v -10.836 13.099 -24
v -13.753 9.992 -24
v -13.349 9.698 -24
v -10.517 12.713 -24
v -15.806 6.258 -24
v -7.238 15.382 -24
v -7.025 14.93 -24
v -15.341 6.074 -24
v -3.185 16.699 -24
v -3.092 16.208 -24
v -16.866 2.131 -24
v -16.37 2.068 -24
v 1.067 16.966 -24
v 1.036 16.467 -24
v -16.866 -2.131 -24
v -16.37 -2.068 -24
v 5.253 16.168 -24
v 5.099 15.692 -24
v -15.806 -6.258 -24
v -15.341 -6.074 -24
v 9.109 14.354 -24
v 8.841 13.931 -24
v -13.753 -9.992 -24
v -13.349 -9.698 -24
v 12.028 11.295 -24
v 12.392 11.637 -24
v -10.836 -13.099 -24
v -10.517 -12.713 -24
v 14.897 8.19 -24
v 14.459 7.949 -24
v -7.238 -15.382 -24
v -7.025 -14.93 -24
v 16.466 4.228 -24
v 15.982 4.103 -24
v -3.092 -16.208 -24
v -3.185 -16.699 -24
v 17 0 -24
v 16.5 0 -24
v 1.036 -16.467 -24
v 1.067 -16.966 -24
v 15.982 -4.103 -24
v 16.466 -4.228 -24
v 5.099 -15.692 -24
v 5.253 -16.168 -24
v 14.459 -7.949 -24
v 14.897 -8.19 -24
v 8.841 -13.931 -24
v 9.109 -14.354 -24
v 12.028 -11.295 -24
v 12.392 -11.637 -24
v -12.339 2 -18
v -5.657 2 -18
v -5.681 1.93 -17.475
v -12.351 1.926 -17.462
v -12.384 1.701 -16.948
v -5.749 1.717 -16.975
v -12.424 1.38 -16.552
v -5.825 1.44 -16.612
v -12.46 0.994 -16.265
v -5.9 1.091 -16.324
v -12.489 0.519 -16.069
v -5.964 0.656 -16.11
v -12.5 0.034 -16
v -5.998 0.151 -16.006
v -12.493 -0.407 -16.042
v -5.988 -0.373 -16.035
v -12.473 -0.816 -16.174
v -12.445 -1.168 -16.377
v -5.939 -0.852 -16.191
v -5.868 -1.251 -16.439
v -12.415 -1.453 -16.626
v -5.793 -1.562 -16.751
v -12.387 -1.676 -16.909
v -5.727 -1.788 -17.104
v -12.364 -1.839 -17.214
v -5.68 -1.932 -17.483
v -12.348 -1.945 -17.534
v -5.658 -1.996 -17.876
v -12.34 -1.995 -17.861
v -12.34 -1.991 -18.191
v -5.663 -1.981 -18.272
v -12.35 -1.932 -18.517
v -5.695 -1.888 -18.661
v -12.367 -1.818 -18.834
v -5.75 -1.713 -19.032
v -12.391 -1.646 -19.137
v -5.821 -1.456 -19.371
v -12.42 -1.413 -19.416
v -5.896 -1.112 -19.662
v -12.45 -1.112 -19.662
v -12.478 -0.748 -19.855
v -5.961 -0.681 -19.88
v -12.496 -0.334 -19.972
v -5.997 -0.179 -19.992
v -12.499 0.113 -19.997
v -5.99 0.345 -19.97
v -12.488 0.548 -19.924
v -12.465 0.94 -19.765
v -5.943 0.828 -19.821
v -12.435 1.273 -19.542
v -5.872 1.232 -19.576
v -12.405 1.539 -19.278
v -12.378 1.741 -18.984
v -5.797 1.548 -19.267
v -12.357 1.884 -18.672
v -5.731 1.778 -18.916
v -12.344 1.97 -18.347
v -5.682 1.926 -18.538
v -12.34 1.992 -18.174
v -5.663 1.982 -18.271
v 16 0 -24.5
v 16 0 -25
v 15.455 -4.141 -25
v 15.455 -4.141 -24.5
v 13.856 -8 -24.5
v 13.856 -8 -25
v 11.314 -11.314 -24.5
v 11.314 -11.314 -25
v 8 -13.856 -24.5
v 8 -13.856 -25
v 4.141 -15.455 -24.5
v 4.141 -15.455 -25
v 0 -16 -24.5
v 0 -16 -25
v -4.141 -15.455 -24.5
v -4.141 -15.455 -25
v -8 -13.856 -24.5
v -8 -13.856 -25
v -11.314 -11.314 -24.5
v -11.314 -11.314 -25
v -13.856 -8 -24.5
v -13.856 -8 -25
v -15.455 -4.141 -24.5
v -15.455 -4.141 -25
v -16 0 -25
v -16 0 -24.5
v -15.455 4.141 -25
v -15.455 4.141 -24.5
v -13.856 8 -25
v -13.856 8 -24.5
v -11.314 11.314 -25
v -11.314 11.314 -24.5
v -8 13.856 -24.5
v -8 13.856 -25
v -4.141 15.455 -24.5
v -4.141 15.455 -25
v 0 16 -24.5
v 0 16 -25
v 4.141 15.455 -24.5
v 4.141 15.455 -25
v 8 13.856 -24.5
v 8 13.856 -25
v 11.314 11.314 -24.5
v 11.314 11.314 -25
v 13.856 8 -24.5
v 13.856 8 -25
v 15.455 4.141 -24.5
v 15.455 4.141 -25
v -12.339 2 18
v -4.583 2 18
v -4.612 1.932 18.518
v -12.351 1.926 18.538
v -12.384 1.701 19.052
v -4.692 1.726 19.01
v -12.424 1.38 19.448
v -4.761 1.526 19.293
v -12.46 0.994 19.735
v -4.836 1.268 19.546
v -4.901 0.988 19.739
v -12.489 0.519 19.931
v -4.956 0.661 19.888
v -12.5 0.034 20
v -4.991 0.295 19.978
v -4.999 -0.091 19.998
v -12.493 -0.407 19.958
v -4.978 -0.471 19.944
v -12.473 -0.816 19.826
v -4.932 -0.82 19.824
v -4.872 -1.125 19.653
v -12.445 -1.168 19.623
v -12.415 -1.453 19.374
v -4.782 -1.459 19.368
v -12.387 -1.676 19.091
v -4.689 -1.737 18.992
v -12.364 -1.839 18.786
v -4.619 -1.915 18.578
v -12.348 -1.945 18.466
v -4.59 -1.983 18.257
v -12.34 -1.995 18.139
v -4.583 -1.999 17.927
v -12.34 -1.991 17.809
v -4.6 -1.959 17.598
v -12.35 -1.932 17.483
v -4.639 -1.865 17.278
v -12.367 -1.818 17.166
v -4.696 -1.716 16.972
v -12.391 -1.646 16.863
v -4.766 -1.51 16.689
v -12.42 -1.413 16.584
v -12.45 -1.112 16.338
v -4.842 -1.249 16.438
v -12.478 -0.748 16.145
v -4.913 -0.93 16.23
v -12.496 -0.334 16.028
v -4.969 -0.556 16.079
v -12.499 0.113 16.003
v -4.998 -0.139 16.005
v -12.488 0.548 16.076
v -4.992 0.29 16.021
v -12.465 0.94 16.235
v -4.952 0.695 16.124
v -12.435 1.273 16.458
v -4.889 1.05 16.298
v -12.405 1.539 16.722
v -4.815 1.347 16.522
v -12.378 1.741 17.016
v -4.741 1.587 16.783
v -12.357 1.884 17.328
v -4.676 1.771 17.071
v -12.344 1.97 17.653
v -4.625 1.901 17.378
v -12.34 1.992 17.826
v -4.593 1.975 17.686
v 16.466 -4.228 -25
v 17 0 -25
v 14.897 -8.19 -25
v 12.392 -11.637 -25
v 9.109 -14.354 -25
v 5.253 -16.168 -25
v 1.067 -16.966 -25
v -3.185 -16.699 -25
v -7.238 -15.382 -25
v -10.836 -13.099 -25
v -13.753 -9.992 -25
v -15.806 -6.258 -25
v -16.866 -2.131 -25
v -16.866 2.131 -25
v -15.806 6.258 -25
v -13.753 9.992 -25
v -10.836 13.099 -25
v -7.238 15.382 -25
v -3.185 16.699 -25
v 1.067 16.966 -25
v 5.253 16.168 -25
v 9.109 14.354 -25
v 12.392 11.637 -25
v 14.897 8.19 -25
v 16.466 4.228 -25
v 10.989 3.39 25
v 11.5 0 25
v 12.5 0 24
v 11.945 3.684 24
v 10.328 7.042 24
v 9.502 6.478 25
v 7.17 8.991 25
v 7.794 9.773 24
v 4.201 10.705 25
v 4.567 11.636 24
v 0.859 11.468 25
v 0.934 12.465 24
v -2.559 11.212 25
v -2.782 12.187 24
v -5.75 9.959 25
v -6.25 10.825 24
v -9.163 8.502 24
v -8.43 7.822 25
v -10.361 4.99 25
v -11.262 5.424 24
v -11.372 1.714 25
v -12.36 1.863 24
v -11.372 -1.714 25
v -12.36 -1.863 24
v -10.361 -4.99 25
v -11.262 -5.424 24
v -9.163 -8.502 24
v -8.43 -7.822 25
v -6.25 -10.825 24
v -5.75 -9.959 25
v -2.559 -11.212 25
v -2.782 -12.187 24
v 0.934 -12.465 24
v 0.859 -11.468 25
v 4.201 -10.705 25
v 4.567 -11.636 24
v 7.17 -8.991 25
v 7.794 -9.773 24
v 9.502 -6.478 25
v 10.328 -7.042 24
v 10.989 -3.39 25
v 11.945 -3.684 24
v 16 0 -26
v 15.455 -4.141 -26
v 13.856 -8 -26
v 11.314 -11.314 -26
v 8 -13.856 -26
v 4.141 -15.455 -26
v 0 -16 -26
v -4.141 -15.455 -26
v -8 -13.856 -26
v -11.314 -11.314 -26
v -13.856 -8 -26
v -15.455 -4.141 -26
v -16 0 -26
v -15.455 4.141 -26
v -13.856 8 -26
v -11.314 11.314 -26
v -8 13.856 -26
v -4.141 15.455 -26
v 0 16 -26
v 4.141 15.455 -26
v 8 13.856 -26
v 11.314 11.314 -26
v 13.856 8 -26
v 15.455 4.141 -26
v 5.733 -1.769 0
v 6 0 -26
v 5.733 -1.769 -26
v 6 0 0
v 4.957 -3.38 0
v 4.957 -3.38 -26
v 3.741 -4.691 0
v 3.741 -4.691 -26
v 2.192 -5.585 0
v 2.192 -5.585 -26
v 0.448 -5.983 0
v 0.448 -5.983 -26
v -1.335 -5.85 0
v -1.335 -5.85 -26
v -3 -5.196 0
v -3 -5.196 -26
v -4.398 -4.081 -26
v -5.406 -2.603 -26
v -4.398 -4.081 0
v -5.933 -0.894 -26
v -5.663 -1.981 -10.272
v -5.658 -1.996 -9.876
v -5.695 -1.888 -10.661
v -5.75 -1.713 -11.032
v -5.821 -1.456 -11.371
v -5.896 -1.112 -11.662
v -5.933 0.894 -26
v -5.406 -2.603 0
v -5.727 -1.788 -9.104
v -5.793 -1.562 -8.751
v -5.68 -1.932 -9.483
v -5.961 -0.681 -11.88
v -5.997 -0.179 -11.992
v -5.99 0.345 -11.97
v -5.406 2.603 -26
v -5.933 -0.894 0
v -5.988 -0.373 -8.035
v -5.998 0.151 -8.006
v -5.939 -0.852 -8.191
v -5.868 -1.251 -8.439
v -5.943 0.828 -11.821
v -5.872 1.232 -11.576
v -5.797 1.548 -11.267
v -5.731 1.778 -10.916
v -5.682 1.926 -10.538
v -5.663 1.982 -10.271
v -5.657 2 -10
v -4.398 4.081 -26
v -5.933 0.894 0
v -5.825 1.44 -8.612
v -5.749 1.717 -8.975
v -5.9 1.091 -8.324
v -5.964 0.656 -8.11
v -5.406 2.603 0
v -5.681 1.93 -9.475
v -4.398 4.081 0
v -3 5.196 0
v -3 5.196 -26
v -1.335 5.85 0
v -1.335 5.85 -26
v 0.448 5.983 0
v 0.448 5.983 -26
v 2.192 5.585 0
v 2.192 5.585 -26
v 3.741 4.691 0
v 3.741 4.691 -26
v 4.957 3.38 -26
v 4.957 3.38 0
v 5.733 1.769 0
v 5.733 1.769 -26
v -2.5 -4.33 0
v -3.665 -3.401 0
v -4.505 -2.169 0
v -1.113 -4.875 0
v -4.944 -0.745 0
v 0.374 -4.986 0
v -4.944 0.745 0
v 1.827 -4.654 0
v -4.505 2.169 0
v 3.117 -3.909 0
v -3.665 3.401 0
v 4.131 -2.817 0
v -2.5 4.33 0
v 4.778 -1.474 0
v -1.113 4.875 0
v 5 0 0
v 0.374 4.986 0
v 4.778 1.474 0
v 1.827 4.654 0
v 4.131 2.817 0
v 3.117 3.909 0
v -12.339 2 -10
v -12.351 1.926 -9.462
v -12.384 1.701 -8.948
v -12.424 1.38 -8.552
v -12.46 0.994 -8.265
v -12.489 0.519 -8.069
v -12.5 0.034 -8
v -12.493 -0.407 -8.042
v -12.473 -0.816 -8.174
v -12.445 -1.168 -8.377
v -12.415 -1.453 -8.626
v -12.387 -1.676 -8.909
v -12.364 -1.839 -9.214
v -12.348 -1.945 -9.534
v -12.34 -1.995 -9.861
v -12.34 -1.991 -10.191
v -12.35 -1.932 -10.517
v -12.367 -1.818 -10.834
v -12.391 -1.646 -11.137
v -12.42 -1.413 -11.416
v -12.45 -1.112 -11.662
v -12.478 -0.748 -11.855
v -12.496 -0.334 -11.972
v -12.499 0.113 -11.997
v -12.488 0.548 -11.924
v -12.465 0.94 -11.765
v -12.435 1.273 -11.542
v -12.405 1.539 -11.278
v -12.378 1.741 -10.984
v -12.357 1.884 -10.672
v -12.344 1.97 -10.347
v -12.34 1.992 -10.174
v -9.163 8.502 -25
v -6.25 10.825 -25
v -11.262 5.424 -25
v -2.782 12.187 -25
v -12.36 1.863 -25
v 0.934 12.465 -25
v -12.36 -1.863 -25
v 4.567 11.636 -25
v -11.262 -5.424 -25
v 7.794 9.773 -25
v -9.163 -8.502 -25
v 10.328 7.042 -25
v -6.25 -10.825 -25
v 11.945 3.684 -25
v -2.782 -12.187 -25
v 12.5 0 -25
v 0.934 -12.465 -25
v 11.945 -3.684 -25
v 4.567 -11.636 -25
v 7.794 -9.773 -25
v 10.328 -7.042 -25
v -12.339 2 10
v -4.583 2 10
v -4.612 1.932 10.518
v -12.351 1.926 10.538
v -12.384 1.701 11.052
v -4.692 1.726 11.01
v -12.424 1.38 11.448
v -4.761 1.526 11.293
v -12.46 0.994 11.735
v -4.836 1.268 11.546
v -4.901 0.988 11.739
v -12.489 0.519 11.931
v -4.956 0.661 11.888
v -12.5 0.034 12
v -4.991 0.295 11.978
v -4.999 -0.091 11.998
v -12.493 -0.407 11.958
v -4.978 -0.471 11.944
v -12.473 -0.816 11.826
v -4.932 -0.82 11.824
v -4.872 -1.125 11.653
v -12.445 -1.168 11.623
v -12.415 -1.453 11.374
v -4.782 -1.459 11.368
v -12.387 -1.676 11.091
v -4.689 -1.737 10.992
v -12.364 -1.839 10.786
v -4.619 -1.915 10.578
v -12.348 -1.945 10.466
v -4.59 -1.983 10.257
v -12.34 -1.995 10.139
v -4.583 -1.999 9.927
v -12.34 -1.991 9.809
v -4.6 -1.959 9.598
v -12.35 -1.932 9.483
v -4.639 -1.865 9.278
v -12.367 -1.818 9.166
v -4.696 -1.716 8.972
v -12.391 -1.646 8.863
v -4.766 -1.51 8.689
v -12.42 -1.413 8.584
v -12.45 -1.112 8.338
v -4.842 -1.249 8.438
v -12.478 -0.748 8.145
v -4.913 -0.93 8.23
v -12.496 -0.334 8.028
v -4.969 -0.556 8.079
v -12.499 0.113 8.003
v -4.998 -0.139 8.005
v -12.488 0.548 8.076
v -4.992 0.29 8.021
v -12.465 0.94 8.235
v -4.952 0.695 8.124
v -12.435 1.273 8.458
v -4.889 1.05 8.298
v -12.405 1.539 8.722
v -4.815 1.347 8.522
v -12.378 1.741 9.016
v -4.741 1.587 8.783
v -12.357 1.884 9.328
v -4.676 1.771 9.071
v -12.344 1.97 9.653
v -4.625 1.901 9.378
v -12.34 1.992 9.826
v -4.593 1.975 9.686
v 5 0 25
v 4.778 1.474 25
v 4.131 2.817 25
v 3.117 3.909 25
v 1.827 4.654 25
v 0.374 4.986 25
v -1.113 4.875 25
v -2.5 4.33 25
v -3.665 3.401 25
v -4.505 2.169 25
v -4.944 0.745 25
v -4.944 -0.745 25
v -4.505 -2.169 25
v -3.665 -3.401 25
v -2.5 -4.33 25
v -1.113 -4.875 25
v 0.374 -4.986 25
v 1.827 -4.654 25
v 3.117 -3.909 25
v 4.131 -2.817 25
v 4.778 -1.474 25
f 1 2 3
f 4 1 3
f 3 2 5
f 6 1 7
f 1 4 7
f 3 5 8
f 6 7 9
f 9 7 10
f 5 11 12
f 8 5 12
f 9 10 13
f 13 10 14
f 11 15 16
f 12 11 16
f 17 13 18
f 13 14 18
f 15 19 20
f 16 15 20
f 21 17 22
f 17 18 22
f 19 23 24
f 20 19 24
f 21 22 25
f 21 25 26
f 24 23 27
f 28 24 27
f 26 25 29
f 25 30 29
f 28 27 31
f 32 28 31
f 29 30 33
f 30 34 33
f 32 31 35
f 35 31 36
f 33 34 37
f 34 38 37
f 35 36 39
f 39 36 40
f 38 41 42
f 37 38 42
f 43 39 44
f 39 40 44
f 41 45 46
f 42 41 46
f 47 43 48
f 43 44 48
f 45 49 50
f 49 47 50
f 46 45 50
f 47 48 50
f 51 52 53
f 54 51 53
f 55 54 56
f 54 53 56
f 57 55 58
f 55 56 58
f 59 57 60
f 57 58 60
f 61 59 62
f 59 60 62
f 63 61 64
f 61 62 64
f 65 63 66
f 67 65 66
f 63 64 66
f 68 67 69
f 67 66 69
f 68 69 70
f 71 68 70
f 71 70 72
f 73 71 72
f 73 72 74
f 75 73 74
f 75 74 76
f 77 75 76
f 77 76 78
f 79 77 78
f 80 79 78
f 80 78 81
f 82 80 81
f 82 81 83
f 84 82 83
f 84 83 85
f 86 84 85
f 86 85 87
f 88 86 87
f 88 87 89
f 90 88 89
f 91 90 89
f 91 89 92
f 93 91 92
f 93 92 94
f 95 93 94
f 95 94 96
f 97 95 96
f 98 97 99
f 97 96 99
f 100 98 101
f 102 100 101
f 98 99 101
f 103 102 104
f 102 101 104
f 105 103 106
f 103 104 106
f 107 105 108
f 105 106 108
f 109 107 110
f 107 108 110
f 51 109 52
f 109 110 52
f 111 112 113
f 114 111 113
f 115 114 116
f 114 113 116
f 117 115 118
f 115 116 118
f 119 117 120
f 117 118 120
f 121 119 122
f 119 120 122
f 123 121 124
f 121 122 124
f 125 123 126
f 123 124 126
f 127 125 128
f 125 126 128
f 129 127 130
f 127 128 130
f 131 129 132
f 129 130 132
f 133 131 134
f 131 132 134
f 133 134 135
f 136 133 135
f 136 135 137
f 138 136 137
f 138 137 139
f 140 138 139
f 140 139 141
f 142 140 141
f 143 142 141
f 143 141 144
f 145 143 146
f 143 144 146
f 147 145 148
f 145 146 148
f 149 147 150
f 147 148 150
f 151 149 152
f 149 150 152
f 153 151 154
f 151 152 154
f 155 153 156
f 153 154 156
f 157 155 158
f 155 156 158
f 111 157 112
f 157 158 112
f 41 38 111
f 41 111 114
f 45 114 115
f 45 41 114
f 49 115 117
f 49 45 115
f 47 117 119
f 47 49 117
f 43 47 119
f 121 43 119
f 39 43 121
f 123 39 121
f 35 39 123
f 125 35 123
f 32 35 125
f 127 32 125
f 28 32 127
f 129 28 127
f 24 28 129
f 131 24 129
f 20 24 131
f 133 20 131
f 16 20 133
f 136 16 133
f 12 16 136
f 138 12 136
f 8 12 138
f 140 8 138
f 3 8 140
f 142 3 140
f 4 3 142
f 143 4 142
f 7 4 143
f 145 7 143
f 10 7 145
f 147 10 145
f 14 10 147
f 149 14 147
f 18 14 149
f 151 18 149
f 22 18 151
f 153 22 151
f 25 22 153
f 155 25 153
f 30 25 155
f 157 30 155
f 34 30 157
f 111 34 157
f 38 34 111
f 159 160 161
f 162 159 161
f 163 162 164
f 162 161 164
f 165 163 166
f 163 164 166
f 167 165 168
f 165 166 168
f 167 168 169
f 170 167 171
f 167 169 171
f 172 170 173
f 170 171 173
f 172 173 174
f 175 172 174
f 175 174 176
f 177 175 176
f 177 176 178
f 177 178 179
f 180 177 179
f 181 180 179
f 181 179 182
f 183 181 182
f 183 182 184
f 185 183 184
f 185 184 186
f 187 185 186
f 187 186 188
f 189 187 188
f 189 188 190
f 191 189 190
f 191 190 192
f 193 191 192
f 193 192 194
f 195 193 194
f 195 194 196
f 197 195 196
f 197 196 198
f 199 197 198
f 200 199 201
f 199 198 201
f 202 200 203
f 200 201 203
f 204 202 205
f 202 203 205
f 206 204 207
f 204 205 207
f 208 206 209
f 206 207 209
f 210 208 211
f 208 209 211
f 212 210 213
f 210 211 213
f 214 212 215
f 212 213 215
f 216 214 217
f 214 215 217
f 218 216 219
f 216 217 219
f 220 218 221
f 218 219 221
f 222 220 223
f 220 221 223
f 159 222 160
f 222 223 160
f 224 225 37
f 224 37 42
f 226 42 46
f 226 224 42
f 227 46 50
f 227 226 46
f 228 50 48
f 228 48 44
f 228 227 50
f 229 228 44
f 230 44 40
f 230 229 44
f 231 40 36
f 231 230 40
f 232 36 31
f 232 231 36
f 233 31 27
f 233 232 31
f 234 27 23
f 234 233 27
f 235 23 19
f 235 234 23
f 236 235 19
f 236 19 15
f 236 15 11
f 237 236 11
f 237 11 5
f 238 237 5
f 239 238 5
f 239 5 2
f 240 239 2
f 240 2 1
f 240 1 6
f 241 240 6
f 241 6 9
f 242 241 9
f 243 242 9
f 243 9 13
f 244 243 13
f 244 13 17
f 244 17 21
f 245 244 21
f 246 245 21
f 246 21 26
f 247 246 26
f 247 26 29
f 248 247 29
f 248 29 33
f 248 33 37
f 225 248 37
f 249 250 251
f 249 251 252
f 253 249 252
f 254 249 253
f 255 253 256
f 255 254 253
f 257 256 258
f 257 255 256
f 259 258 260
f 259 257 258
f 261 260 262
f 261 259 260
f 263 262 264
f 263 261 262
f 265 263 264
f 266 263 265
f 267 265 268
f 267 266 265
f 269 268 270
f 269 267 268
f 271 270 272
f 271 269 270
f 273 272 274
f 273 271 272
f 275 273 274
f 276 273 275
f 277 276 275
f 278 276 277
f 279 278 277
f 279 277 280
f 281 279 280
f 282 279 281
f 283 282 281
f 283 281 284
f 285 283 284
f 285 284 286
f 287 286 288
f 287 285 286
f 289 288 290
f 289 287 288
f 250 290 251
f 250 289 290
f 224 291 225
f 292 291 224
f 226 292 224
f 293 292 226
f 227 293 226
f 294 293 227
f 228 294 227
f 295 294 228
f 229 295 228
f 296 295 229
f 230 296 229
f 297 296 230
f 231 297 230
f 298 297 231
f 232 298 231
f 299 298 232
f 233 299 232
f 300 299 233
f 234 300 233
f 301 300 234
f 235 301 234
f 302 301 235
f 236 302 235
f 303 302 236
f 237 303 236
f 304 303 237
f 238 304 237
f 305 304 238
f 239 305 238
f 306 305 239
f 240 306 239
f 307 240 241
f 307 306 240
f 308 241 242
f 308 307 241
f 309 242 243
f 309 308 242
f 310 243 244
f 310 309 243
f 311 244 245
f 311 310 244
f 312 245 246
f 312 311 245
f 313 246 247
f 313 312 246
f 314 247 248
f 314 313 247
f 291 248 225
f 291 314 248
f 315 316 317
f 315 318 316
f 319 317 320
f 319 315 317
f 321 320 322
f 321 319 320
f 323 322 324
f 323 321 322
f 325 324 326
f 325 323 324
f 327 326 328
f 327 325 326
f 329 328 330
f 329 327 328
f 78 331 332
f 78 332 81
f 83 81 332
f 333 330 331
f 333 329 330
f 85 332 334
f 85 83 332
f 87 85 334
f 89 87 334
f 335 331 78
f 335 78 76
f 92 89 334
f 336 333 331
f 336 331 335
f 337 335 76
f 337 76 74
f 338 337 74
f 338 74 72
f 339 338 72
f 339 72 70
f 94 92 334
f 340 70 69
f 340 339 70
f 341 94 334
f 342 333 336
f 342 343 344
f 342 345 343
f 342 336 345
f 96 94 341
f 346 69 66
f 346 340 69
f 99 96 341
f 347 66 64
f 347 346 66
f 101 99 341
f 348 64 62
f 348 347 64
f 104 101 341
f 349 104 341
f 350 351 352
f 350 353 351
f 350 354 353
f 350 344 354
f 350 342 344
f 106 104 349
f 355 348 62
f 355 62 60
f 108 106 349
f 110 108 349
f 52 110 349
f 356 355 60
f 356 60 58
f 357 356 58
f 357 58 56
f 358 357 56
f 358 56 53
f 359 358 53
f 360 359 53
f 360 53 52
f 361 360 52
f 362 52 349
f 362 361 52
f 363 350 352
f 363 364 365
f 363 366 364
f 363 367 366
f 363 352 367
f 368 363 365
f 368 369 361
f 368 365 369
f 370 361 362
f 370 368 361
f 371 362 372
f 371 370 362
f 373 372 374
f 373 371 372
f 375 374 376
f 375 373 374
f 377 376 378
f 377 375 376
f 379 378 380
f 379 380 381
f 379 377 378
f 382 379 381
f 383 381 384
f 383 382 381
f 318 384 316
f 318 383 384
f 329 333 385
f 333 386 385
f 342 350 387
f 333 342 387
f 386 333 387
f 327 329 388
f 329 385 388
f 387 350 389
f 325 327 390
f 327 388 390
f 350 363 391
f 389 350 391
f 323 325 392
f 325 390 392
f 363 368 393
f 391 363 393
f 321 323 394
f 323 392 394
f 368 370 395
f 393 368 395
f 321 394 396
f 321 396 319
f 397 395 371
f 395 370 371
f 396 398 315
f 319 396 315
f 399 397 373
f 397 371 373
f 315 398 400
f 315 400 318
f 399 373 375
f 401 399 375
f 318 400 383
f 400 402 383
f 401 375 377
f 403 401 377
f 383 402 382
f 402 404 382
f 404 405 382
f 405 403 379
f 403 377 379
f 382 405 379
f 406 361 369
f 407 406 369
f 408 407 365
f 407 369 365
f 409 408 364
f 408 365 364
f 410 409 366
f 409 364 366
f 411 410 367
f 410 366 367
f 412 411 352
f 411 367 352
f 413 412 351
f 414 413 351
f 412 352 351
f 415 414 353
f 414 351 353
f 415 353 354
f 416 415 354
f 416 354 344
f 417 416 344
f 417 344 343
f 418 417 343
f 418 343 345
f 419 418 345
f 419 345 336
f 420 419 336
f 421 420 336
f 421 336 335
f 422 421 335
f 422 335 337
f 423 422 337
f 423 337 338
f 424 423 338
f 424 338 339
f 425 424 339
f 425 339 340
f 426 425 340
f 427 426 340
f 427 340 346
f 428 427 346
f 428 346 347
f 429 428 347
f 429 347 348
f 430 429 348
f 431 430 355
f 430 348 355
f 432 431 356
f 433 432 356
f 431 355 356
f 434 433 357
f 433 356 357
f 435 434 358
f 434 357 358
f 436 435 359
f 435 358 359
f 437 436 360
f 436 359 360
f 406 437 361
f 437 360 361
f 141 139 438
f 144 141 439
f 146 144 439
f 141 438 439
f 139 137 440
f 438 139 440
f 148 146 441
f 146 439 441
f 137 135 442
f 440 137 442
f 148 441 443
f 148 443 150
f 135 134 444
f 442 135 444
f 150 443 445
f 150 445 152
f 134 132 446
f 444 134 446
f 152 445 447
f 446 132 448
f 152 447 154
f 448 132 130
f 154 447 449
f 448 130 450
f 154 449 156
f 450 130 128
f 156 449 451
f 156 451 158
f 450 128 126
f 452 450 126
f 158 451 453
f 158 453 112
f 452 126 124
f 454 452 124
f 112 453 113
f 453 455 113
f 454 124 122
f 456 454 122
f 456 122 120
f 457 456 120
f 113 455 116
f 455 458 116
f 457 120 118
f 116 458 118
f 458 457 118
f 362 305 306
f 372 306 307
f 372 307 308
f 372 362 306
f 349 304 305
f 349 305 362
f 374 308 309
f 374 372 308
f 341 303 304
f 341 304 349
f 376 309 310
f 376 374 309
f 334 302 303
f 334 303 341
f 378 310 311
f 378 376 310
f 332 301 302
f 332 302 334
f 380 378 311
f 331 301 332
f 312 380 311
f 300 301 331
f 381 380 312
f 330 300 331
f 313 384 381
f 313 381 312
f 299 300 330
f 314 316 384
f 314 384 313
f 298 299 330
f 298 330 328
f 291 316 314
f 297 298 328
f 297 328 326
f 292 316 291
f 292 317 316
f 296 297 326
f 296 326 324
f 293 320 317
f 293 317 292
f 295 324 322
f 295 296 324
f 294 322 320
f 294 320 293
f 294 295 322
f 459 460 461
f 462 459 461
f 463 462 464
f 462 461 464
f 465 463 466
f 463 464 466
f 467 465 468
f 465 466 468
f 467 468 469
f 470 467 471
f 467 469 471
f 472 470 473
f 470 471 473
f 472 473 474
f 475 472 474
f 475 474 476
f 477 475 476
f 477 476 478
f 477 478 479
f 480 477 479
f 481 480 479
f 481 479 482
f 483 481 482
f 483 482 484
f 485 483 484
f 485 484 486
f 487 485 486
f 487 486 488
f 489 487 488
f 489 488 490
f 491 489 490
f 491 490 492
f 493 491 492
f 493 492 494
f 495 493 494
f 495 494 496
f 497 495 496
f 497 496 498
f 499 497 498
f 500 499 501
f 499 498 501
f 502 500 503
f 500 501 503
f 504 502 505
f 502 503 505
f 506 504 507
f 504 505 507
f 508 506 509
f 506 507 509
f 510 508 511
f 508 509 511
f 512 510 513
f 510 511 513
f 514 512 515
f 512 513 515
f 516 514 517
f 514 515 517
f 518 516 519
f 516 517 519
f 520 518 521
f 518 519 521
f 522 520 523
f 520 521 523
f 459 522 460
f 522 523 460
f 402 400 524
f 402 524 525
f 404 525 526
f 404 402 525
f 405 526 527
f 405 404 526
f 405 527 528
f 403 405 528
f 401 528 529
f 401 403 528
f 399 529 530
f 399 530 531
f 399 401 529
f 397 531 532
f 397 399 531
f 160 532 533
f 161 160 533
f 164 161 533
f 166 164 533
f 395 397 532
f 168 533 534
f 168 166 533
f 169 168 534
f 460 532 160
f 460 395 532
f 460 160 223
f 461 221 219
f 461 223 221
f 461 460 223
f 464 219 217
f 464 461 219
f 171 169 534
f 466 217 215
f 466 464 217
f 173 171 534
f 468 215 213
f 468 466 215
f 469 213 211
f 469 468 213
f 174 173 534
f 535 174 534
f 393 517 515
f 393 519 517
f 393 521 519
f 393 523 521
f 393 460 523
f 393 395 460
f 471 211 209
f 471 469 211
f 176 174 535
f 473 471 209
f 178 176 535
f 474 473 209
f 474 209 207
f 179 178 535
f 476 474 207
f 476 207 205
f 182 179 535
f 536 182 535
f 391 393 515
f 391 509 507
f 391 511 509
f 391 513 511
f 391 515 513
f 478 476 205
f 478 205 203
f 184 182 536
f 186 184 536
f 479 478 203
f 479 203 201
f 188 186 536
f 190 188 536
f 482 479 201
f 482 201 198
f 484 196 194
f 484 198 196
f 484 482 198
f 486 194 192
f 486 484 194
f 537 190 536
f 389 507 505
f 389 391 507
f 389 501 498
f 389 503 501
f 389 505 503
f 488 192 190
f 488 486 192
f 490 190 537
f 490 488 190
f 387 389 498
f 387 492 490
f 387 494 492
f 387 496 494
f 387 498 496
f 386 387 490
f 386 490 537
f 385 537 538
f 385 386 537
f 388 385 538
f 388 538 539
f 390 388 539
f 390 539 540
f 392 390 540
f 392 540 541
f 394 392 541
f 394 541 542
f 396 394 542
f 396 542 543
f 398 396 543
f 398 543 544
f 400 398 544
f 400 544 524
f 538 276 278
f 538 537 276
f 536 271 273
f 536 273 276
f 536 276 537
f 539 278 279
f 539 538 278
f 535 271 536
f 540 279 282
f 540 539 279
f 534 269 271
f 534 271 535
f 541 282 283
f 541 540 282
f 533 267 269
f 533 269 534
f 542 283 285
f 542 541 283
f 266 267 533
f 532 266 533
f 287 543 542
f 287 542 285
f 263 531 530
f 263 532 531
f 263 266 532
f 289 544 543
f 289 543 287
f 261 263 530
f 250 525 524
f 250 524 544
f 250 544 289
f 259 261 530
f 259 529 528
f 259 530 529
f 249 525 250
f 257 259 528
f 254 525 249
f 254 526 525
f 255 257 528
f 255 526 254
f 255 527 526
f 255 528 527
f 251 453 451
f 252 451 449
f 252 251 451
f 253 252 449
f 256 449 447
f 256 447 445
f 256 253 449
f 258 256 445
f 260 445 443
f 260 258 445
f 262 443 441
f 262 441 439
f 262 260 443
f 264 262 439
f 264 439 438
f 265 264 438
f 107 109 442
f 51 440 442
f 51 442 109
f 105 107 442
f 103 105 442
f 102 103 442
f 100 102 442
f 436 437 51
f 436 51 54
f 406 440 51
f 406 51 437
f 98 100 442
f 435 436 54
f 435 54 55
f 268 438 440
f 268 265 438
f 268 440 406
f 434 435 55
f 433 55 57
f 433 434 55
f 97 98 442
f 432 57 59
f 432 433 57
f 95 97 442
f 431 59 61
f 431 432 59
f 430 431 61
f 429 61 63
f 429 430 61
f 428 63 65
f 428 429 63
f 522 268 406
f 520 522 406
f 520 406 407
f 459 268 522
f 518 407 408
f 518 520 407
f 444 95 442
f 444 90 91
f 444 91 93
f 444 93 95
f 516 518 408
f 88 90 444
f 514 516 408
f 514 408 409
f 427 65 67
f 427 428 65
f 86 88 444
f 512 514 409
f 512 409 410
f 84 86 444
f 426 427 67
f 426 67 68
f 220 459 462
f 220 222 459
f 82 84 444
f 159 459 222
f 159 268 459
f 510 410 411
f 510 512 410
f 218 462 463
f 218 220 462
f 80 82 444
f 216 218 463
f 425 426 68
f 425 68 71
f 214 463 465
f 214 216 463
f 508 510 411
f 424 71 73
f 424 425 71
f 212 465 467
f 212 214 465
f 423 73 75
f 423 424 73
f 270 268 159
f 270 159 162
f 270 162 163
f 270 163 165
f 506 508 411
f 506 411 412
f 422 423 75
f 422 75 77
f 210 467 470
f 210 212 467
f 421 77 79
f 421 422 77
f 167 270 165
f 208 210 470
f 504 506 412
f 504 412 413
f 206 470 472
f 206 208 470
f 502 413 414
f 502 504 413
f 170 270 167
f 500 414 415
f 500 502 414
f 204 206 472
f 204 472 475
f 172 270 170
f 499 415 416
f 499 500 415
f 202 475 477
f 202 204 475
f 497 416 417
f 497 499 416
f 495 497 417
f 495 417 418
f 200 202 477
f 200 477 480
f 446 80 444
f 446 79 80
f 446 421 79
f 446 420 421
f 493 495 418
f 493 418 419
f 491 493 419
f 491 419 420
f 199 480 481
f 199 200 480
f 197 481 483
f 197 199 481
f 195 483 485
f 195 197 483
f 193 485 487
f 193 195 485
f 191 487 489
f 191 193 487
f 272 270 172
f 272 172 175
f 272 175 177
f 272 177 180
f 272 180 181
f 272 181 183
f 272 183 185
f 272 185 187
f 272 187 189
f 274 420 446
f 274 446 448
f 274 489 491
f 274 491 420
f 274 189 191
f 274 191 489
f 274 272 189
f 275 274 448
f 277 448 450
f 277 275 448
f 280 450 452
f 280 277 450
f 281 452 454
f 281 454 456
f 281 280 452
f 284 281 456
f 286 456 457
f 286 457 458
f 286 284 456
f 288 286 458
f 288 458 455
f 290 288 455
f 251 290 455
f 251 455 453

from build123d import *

# Parameters (mm, degrees)
F0_R     = 12.5
F0_R_2   = 6
F0_R_3   = 5
F1_DEPTH = 25
F2_DEPTH = 25
F3_R     = 2
F4_DEPTH = 25
F5_SIZE  = 1
F6_R     = 17
F6_R_2   = 16
F6_R_3   = 12.5
F6_R_4   = 6
F7_DEPTH = 1
F8_DEPTH = 1
F9_SIZE  = 0.5
F10_SIZE = 0.99999


# Not quite as in the source:
# - a fillet or chamfer is up to 0.001 mm smaller than in the source, because OpenCascade refuses the exact size


with BuildPart() as f1:
    # F0 (on Top) → F1 (new body)
    with BuildSketch(Plane.XY):
        Circle(F0_R)
        Circle(F0_R_2, mode=Mode.SUBTRACT)
        Circle(F0_R_2)
        Circle(F0_R_3, mode=Mode.SUBTRACT)
    extrude(amount=F1_DEPTH)

    # F0 (on Top) → F2 (join)
    with BuildSketch(Plane.XY):
        Circle(F0_R)
        Circle(F0_R_2, mode=Mode.SUBTRACT)
    extrude(amount=-F2_DEPTH)

    # F3 (on Right) → F4 (cut)
    with BuildSketch(Plane.YZ):
        with Locations((0, -18)):
            Circle(F3_R)
        with Locations((0, -10)):
            Circle(F3_R)
        with Locations((0, 10)):
            Circle(F3_R)
        with Locations((0, 18)):
            Circle(F3_R)
    extrude(amount=-F4_DEPTH, mode=Mode.SUBTRACT)

    # F5
    f5_edges = [f1.edges().sort_by_distance(p)[0] for p in [
        (-12.5, 0, 25),
    ]]
    chamfer(f5_edges, length=F5_SIZE)

    # F6 (on face) → F7 (join)
    with BuildSketch(Plane(origin=(0, 0, -25), x_dir=(1, 0, 0), z_dir=(0, 0, -1))):
        Circle(F6_R)
        Circle(F6_R_2, mode=Mode.SUBTRACT)
        Circle(F6_R_2)
        Circle(F6_R_3, mode=Mode.SUBTRACT)
        Circle(F6_R_3)
        Circle(F6_R_4, mode=Mode.SUBTRACT)
    extrude(amount=F7_DEPTH)

    # F6 (on face) → F8 (join)
    with BuildSketch(Plane(origin=(0, 0, -25), x_dir=(1, 0, 0), z_dir=(0, 0, -1))):
        Circle(F6_R)
        Circle(F6_R_2, mode=Mode.SUBTRACT)
    extrude(amount=-F8_DEPTH)

    # F9
    f9_edges = [f1.edges().sort_by_distance(p)[0] for p in [
        (-16, 0, -24),
    ]]
    chamfer(f9_edges, length=F9_SIZE)

    # F10 (size 1 in the source; OpenCascade refuses exactly that, so slightly less here)
    f10_edges = [f1.edges().sort_by_distance(p)[0] for p in [
        (-17, 0, -26),
    ]]
    chamfer(f10_edges, length=F10_SIZE)


solid = f1.part
